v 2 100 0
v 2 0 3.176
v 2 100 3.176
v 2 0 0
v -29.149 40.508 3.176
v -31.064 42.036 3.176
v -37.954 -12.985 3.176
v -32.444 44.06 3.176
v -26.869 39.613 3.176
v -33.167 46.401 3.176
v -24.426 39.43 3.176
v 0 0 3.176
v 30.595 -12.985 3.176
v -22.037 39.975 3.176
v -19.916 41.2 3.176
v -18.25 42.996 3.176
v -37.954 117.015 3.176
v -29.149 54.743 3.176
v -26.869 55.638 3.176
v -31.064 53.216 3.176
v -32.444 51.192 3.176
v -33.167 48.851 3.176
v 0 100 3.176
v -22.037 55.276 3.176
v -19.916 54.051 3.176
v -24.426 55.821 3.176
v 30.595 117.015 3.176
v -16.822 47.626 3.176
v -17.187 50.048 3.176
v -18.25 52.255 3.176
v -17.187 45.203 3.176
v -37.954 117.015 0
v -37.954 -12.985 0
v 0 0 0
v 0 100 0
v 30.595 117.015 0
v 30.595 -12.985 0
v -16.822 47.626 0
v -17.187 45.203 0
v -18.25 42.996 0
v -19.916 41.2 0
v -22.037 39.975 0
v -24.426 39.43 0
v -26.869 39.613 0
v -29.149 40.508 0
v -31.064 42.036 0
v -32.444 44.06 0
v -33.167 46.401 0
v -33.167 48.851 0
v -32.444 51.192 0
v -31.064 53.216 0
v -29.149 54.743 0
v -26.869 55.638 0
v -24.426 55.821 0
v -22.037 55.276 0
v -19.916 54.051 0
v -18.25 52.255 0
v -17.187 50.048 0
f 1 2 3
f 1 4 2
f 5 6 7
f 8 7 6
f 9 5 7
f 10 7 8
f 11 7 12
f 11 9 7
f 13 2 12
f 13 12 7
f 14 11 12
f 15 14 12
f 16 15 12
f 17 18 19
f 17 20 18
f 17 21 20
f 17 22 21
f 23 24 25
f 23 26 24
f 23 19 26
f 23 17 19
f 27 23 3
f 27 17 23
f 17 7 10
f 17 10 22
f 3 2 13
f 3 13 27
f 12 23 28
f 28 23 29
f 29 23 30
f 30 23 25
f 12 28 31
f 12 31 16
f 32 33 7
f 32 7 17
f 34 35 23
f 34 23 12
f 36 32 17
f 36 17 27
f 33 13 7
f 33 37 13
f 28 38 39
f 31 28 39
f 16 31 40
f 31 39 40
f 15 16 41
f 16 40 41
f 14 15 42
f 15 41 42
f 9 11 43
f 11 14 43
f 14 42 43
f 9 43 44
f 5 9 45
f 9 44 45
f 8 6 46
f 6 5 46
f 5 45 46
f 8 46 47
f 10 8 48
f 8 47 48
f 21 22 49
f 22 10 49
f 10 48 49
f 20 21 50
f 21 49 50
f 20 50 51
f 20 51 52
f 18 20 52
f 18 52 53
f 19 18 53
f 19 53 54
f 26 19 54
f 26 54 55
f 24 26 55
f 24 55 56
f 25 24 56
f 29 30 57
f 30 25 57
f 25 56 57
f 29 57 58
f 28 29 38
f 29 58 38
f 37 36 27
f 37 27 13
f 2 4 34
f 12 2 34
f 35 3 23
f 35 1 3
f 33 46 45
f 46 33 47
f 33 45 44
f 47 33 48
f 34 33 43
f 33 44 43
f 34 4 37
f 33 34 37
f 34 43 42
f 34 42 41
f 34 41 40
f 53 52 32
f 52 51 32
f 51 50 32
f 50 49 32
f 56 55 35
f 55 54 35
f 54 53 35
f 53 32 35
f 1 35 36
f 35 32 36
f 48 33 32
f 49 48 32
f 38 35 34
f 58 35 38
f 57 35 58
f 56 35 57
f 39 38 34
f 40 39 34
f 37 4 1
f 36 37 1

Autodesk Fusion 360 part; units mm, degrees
sketch "Sketch1" plane through (0, 0, 0) normal (0, 0, 1) x (1, 0, 0)
  line L0 (0, 114) -> (2, 114)
  line L1 (2, 0) -> (0, 0)
  line L2 (30.5953, -12.9847) -> (-37.9542, -12.9847)
  line L3 (-37.9542, -12.9847) -> (-37.9542, 117.0153)
  line L4 (-37.9542, 117.0153) -> (30.5953, 117.0153)
  line L5 (30.5953, 117.0153) -> (30.5953, -12.9847)
  line L6 (0, 0) -> (2, 0)
  line L7 (2, 0) -> (2, 100)
  line L8 (2, 100) -> (0, 100)
  line L9 (0, 100) -> (0, 0)
  circle A0 centre (-25.0399, 47.6257) radius 8.2184
  dimension "d2" = 2
  dimension "d5" = 68.5495
  dimension "d8" = 2
  dimension "d9" = 100
  dimension "d10" = 130
  dimension "d19" = 16.4367
extrude "Extrude7" add sketch "Sketch1" along normal blind 3.176
